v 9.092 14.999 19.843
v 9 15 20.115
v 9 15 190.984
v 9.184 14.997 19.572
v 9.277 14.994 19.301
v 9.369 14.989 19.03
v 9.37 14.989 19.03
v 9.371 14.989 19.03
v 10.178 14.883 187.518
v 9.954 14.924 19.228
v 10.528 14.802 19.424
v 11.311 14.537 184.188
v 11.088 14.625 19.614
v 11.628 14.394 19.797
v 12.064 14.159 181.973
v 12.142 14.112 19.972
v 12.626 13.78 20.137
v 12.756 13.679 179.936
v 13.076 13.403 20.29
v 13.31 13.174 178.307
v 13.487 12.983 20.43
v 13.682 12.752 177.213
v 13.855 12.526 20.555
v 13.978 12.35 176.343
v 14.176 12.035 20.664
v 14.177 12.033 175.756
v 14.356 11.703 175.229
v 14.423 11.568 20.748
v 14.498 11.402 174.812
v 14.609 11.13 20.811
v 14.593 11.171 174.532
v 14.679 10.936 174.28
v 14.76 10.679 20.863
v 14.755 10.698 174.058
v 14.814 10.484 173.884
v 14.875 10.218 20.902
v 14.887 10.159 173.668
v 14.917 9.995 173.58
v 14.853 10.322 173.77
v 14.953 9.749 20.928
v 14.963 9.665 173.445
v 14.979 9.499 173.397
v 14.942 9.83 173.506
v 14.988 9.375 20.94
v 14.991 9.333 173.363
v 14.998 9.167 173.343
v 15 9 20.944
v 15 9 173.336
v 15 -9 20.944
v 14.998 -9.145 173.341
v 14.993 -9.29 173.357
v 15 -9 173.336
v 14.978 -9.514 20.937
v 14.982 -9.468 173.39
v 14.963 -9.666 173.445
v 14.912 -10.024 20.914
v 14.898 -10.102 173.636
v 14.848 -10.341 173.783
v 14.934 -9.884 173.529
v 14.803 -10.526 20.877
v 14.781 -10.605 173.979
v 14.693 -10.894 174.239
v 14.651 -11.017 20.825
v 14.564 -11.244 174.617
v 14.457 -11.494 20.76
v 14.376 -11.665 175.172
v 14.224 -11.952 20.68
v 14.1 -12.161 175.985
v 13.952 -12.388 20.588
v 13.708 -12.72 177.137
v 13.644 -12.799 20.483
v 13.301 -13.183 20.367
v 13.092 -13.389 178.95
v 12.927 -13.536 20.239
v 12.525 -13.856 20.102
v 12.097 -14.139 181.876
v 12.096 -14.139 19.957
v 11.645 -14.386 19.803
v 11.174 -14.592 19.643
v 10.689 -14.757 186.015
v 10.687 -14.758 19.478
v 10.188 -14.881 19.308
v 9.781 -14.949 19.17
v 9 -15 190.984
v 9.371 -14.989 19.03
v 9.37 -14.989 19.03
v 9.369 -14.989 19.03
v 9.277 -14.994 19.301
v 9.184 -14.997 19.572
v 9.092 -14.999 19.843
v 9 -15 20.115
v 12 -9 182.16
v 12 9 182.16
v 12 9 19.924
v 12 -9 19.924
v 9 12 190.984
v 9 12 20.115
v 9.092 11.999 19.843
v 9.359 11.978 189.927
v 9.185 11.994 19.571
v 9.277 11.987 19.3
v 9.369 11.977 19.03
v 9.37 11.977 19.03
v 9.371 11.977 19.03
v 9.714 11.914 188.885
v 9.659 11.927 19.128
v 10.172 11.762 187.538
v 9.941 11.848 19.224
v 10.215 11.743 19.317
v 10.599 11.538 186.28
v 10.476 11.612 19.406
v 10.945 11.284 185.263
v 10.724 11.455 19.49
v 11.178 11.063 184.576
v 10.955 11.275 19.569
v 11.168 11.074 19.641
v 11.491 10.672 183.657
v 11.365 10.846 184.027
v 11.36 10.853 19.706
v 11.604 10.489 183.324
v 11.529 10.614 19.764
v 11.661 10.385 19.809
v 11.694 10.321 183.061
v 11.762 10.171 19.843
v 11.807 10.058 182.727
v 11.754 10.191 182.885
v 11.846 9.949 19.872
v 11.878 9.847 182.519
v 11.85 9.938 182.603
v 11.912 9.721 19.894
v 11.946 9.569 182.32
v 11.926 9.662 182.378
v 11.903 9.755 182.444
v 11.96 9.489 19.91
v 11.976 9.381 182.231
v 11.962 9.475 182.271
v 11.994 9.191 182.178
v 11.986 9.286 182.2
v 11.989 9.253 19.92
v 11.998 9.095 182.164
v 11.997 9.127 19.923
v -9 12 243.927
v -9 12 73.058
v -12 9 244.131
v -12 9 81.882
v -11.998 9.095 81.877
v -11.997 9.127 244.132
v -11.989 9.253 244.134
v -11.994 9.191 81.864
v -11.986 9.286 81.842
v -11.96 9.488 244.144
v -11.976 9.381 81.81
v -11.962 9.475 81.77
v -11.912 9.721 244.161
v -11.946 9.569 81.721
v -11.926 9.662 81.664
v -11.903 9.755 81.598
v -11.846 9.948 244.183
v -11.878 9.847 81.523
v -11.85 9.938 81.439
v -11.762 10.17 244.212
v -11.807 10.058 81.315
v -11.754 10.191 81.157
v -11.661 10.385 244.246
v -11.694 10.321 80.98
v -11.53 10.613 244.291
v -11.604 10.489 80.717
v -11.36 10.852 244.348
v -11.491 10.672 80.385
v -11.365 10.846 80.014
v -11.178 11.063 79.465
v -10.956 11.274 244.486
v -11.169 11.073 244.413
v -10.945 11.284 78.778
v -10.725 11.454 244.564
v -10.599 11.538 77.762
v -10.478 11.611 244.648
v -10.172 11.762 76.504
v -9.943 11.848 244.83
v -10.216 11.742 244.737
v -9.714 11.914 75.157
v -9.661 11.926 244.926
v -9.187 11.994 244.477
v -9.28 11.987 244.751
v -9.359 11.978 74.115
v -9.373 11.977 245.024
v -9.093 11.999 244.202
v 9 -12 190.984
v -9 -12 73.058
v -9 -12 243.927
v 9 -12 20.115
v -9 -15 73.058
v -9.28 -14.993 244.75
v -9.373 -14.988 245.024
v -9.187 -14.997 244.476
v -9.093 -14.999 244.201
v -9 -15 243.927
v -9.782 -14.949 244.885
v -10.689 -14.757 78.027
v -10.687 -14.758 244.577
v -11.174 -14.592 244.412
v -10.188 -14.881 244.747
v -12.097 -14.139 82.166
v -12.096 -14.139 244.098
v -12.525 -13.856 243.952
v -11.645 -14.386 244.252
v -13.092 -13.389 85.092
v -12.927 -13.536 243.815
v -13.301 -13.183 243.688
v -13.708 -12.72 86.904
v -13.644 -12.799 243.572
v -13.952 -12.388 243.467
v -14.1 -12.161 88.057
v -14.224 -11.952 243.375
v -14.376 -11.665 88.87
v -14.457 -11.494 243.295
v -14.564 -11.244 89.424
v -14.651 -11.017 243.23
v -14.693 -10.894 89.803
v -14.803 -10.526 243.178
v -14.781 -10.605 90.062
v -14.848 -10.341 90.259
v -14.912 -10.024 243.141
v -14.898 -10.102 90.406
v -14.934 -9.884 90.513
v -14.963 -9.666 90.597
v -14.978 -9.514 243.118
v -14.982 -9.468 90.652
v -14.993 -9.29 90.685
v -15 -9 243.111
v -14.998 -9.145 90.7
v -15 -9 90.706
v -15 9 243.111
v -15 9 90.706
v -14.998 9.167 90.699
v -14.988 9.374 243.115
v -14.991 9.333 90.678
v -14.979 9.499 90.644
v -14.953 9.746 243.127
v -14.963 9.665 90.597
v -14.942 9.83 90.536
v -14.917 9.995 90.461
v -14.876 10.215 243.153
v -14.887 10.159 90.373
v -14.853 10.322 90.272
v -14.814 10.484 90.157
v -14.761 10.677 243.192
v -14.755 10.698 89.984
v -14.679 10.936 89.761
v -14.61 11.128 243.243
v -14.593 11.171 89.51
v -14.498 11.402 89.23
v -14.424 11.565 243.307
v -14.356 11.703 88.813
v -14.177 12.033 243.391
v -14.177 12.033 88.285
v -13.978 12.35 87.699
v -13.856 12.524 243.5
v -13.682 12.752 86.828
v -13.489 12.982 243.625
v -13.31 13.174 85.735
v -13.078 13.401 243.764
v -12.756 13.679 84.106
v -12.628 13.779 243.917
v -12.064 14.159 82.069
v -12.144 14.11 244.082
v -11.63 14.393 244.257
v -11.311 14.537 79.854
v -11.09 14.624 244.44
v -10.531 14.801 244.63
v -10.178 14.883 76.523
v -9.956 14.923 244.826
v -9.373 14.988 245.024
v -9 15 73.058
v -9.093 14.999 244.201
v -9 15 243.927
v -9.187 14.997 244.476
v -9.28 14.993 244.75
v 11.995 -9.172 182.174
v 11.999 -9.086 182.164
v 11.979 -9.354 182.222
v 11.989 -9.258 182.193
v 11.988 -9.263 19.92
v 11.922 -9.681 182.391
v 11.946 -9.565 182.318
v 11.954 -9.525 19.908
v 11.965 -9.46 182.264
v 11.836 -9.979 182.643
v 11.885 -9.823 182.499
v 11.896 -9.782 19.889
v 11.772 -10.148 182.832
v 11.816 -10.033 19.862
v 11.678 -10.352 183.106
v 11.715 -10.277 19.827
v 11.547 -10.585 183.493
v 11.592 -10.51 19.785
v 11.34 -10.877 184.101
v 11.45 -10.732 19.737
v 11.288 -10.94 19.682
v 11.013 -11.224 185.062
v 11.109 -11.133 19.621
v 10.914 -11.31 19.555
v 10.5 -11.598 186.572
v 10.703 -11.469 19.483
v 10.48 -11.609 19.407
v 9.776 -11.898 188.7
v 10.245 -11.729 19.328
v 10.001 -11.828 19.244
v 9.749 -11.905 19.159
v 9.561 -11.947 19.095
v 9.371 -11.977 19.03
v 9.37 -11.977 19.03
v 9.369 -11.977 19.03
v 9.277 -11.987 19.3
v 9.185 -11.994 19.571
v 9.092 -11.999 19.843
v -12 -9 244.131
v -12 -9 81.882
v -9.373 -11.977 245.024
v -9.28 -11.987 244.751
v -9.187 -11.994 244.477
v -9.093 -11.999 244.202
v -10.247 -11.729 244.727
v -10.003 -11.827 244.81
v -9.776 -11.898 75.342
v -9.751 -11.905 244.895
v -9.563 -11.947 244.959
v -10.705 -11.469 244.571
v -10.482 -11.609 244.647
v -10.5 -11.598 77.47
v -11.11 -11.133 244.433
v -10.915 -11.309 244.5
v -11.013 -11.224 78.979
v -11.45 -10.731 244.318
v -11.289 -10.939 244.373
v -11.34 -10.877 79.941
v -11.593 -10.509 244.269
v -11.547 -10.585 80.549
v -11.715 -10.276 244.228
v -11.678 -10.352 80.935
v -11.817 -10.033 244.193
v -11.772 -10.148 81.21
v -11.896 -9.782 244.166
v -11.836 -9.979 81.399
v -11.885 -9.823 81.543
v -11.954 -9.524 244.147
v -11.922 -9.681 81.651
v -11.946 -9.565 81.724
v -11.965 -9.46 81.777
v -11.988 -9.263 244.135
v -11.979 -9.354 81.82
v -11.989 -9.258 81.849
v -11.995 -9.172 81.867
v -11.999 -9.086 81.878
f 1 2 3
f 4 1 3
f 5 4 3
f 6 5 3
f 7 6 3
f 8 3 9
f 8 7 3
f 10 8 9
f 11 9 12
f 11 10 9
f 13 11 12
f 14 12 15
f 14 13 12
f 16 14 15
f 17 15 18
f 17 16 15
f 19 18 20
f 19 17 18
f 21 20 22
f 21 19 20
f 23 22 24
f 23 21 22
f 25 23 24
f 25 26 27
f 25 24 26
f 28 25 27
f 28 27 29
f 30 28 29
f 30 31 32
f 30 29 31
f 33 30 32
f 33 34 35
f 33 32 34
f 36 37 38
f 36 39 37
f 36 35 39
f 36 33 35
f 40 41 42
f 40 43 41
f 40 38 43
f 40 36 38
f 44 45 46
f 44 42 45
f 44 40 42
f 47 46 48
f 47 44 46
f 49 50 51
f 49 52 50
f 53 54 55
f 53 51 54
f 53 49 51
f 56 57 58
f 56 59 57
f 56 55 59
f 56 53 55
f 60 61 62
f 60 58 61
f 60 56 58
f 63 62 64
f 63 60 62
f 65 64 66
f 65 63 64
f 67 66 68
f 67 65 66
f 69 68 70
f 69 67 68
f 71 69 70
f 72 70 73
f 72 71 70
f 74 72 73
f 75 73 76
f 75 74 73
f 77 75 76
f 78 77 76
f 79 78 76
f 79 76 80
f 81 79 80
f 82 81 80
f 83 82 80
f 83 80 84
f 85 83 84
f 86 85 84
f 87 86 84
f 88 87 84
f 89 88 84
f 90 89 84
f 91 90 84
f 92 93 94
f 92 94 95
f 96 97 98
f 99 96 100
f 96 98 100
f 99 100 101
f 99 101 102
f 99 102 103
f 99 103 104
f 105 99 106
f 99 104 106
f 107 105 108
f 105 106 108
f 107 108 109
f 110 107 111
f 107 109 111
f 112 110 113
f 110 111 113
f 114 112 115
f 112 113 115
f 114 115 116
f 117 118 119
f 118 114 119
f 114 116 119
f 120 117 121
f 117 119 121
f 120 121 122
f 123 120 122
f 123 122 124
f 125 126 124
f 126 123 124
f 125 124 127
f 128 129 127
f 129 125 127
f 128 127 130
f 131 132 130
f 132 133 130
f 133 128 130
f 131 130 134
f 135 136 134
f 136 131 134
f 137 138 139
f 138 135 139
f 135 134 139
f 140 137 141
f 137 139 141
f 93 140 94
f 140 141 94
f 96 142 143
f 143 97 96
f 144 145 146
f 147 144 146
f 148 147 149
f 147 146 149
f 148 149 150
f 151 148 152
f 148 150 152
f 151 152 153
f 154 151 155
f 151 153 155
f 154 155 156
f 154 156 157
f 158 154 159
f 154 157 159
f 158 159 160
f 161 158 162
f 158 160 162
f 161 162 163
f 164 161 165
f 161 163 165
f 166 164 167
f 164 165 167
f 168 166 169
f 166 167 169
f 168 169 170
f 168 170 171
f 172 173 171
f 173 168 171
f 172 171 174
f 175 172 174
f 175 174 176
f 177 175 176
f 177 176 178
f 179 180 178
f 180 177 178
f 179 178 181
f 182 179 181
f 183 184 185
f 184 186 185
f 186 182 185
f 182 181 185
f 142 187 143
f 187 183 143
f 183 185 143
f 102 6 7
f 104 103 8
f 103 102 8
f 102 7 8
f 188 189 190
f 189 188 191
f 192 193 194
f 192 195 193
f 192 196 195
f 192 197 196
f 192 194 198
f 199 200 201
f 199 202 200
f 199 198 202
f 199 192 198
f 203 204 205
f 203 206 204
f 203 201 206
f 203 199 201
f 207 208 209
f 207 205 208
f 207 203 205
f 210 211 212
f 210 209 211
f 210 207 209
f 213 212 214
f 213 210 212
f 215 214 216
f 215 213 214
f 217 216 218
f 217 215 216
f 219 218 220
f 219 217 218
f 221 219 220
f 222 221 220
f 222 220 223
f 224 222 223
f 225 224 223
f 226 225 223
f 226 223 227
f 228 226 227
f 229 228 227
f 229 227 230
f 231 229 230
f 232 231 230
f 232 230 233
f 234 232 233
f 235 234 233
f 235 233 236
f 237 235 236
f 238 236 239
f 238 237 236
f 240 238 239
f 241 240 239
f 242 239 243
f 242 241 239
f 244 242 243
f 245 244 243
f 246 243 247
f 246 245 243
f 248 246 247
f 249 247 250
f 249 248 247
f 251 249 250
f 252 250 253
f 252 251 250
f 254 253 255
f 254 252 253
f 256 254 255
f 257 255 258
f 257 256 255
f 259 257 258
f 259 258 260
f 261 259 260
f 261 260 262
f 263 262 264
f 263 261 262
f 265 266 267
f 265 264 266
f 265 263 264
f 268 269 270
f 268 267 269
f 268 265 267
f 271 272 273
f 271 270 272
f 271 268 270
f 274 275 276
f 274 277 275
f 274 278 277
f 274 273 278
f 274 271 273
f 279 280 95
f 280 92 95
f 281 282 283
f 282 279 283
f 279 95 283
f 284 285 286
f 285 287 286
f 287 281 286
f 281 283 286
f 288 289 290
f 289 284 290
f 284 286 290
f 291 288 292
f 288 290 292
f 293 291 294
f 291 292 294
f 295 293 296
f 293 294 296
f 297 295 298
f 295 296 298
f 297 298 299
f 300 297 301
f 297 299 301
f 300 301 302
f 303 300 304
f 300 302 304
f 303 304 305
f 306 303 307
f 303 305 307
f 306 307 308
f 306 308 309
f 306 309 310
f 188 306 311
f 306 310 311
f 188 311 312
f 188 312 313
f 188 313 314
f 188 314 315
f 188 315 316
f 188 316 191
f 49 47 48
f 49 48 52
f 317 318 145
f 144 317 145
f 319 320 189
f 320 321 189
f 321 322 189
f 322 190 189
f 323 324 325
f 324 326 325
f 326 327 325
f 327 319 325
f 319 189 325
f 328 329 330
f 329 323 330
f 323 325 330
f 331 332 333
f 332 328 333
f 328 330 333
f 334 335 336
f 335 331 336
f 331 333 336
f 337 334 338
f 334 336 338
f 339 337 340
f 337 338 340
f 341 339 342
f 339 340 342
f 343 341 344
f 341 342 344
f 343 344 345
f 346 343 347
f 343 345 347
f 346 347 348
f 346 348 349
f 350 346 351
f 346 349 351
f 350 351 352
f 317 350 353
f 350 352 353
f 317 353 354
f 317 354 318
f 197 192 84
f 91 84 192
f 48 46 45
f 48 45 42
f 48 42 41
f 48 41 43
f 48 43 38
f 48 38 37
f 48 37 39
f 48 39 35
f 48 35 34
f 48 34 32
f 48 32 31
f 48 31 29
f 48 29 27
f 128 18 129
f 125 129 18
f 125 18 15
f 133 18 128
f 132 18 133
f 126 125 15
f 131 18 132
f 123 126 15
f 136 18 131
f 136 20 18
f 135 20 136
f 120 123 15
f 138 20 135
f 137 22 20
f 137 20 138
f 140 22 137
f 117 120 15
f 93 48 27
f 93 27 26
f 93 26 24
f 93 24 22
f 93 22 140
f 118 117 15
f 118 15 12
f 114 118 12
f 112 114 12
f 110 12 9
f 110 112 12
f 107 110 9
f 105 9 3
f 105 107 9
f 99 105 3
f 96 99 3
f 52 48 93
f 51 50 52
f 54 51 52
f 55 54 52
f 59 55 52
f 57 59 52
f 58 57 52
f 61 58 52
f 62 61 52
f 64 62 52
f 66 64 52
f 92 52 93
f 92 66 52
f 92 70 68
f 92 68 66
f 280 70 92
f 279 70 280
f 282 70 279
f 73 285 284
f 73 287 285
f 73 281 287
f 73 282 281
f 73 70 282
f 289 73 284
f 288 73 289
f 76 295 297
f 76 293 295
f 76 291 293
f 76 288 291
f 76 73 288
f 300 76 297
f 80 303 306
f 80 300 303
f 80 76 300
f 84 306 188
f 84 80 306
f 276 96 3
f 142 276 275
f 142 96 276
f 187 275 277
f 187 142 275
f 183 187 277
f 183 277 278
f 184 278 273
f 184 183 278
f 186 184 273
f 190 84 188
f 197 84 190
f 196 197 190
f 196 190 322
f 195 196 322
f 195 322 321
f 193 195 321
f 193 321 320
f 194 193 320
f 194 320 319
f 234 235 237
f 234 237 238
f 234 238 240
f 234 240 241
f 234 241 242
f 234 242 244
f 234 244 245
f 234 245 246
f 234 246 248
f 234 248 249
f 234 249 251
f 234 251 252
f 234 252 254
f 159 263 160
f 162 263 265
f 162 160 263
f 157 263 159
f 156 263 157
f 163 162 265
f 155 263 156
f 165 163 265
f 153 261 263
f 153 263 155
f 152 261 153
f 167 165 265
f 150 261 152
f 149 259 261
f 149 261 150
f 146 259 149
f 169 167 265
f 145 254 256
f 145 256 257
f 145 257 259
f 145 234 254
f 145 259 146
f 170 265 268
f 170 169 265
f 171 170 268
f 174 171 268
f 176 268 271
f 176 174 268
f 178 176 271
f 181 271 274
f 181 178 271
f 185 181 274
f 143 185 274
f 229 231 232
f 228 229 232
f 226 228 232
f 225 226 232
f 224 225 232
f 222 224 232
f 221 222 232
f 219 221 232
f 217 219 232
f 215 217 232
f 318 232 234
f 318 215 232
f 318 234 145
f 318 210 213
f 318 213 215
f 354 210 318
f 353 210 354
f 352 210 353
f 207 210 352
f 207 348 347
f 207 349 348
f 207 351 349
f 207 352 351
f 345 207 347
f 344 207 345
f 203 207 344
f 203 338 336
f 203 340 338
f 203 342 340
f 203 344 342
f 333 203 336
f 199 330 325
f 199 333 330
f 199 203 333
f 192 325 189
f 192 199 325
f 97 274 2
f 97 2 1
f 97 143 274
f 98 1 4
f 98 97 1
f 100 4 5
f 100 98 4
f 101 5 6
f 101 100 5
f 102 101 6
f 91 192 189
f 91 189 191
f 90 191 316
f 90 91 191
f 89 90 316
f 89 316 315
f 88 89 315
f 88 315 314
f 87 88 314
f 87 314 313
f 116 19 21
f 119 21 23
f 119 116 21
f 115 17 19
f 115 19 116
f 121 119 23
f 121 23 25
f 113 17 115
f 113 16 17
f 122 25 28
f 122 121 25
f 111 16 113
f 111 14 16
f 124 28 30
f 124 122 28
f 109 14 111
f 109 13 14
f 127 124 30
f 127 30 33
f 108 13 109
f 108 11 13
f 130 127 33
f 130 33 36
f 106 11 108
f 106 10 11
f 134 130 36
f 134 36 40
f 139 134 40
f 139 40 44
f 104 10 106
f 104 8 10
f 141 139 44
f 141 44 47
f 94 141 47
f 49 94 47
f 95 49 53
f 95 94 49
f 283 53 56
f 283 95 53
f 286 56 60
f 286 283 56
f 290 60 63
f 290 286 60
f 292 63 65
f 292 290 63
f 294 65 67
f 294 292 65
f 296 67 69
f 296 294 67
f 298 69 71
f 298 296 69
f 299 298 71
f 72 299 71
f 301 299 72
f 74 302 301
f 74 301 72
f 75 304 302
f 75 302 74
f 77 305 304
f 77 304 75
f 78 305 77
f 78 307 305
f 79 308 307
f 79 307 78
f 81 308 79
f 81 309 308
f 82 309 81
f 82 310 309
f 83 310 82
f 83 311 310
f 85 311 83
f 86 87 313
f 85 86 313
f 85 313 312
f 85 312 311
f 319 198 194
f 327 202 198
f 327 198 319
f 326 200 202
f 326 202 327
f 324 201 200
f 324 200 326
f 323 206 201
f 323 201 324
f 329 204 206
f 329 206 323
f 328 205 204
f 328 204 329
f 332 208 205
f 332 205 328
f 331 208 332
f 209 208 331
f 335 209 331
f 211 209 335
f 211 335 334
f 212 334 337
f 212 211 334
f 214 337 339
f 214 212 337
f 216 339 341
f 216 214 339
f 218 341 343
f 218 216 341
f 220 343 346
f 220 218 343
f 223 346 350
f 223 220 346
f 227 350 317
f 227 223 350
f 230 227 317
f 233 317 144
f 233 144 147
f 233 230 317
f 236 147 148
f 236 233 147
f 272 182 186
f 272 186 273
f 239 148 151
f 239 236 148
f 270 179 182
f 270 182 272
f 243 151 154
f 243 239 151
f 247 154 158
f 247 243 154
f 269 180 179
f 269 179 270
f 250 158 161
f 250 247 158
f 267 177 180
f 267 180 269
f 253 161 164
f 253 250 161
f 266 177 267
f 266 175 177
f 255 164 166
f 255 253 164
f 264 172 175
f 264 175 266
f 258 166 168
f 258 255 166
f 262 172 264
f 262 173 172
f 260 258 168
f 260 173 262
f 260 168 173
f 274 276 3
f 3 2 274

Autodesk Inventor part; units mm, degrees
ref_plane "Start Plane" through (0, 0, 19.0301) normal (0, 0, 1) x (1, 0, 0)
ref_plane "End Plane" through (0, 0, 245.0248) normal (0, 0, 1) x (1, 0, 0)
sketch "Sketch" plane through (0, 0, 0) normal (0, 0, 1) x (1, 0, 0)
  line L0 (-15, -9) -> (-15, 9)
  line L1 (-9, 15) -> (9, 15)
  line L2 (15, 9) -> (15, -9)
  line L3 (9, -15) -> (-9, -15)
  arc A0 (-15, -9) -> (-9, -15) centre (-9, -9) ccw
  arc A1 (-9, 15) -> (-15, 9) centre (-9, 9) ccw
  arc A2 (15, 9) -> (9, 15) centre (9, 9) ccw
  arc A3 (9, -15) -> (15, -9) centre (9, -9) ccw
  arc A4 (-9, 12) -> (-12, 9) centre (-9, 9) ccw
  line L4 (-9, 12) -> (9, 12)
  arc A5 (12, 9) -> (9, 12) centre (9, 9) ccw
  line L5 (12, 9) -> (12, -9)
  arc A6 (9, -12) -> (12, -9) centre (9, -9) ccw
  line L6 (9, -12) -> (-9, -12)
  arc A7 (-12, -9) -> (-9, -12) centre (-9, -9) ccw
  line L7 (-12, -9) -> (-12, 9)
  line L8 (0, 22.7397) -> (0, -22.7397) construction
  line L9 (-22.7397, 0) -> (22.7397, 0) construction
  dimension "d7" = 6
  dimension "d10" = 30
  dimension "d11" = 30
  dimension "d12" = 3
  dimension "d15" = 15
  dimension "d16" = 15
extrude "Body" add sketch "Sketch" along normal up to surface (225.9947 mm away) from surface at 19.0301
sketch "Sketch3" plane through (0, 0, 0) normal (0, 0, 1) x (1, 0, 0)
  line L0 (0, 0) -> (10, 0)
ref_plane "Work Plane3" through (0, 0, 0) normal (0, -1, 0) x (1, 0, 0)
ref_plane "Work Plane4" through (-108.1214, 9, 364.6022) normal (-0.9468, 0, -0.3219) x (-0.3219, 0, 0.9468)
split "Split1" plane through (-108.1214, 9, 364.6022) removes the side toward (-0.9468, 0, -0.3219)
ref_plane "Work Plane5" through (75.6471, 9, 41.5633) normal (0.3219, 0, -0.9468) x (-0.9468, 0, -0.3219)
split "Split2" plane through (75.6471, 9, 41.5633) removes the side toward (0.3219, 0, -0.9468)
ref_plane "Work Plane6" through (-14.2016, 9, 259.2264) normal (0.9468, 0, 0.3219) x (0.3219, 0, -0.9468)
split "Split3" plane through (-14.2016, 9, 259.2264) removes the side toward (0.9468, 0, 0.3219)
ref_plane "Work Plane7" through (-75.6471, 9, 222.4916) normal (-0.3219, 0, 0.9468) x (0.9468, 0, 0.3219)
split "Split4" plane through (-75.6471, 9, 222.4916) removes the side toward (-0.3219, 0, 0.9468)
sketch "Sketch4" plane through (0, 0, 0) normal (0, -1, 0) x (1, 0, 0)
  line L0 (-2, 19.0301) -> (12, 19.0301) projected
  line L1 (-2, 245.0248) -> (12, 245.0248) projected
  dimension "d18" = 225.9947
equation "\"d7\" = G_IR"
equation "\"d10\" = G_H"
equation "\"d11\" = G_W"
equation "\"d12\" = G_T"
equation "\"d15\" = 0.5 * d10"
equation "\"d16\" = 0.5 * d11"
equation "\"d3\" = G_L"
equation "\"G_W\" = 30"
equation "\"G_H\" = 30"
equation "\"G_T\" = 3"
equation "\"G_IR\" = 6"
equation "\"G_L\" = d18"
equation "\"G_OFFSET_START\" = -19.03013"
equation "\"G_OFFSET_END\" = -19.03013"
equation "\"d13\" = -G_OFFSET_START"
equation "\"d14\" = G_OFFSET_END + B_L"
equation "\"B_L\" = 264.05492"
properties part number "DIN EN 10219-2 - 30 x 30 x 3  - 225.99" material "Steel, Mild"
